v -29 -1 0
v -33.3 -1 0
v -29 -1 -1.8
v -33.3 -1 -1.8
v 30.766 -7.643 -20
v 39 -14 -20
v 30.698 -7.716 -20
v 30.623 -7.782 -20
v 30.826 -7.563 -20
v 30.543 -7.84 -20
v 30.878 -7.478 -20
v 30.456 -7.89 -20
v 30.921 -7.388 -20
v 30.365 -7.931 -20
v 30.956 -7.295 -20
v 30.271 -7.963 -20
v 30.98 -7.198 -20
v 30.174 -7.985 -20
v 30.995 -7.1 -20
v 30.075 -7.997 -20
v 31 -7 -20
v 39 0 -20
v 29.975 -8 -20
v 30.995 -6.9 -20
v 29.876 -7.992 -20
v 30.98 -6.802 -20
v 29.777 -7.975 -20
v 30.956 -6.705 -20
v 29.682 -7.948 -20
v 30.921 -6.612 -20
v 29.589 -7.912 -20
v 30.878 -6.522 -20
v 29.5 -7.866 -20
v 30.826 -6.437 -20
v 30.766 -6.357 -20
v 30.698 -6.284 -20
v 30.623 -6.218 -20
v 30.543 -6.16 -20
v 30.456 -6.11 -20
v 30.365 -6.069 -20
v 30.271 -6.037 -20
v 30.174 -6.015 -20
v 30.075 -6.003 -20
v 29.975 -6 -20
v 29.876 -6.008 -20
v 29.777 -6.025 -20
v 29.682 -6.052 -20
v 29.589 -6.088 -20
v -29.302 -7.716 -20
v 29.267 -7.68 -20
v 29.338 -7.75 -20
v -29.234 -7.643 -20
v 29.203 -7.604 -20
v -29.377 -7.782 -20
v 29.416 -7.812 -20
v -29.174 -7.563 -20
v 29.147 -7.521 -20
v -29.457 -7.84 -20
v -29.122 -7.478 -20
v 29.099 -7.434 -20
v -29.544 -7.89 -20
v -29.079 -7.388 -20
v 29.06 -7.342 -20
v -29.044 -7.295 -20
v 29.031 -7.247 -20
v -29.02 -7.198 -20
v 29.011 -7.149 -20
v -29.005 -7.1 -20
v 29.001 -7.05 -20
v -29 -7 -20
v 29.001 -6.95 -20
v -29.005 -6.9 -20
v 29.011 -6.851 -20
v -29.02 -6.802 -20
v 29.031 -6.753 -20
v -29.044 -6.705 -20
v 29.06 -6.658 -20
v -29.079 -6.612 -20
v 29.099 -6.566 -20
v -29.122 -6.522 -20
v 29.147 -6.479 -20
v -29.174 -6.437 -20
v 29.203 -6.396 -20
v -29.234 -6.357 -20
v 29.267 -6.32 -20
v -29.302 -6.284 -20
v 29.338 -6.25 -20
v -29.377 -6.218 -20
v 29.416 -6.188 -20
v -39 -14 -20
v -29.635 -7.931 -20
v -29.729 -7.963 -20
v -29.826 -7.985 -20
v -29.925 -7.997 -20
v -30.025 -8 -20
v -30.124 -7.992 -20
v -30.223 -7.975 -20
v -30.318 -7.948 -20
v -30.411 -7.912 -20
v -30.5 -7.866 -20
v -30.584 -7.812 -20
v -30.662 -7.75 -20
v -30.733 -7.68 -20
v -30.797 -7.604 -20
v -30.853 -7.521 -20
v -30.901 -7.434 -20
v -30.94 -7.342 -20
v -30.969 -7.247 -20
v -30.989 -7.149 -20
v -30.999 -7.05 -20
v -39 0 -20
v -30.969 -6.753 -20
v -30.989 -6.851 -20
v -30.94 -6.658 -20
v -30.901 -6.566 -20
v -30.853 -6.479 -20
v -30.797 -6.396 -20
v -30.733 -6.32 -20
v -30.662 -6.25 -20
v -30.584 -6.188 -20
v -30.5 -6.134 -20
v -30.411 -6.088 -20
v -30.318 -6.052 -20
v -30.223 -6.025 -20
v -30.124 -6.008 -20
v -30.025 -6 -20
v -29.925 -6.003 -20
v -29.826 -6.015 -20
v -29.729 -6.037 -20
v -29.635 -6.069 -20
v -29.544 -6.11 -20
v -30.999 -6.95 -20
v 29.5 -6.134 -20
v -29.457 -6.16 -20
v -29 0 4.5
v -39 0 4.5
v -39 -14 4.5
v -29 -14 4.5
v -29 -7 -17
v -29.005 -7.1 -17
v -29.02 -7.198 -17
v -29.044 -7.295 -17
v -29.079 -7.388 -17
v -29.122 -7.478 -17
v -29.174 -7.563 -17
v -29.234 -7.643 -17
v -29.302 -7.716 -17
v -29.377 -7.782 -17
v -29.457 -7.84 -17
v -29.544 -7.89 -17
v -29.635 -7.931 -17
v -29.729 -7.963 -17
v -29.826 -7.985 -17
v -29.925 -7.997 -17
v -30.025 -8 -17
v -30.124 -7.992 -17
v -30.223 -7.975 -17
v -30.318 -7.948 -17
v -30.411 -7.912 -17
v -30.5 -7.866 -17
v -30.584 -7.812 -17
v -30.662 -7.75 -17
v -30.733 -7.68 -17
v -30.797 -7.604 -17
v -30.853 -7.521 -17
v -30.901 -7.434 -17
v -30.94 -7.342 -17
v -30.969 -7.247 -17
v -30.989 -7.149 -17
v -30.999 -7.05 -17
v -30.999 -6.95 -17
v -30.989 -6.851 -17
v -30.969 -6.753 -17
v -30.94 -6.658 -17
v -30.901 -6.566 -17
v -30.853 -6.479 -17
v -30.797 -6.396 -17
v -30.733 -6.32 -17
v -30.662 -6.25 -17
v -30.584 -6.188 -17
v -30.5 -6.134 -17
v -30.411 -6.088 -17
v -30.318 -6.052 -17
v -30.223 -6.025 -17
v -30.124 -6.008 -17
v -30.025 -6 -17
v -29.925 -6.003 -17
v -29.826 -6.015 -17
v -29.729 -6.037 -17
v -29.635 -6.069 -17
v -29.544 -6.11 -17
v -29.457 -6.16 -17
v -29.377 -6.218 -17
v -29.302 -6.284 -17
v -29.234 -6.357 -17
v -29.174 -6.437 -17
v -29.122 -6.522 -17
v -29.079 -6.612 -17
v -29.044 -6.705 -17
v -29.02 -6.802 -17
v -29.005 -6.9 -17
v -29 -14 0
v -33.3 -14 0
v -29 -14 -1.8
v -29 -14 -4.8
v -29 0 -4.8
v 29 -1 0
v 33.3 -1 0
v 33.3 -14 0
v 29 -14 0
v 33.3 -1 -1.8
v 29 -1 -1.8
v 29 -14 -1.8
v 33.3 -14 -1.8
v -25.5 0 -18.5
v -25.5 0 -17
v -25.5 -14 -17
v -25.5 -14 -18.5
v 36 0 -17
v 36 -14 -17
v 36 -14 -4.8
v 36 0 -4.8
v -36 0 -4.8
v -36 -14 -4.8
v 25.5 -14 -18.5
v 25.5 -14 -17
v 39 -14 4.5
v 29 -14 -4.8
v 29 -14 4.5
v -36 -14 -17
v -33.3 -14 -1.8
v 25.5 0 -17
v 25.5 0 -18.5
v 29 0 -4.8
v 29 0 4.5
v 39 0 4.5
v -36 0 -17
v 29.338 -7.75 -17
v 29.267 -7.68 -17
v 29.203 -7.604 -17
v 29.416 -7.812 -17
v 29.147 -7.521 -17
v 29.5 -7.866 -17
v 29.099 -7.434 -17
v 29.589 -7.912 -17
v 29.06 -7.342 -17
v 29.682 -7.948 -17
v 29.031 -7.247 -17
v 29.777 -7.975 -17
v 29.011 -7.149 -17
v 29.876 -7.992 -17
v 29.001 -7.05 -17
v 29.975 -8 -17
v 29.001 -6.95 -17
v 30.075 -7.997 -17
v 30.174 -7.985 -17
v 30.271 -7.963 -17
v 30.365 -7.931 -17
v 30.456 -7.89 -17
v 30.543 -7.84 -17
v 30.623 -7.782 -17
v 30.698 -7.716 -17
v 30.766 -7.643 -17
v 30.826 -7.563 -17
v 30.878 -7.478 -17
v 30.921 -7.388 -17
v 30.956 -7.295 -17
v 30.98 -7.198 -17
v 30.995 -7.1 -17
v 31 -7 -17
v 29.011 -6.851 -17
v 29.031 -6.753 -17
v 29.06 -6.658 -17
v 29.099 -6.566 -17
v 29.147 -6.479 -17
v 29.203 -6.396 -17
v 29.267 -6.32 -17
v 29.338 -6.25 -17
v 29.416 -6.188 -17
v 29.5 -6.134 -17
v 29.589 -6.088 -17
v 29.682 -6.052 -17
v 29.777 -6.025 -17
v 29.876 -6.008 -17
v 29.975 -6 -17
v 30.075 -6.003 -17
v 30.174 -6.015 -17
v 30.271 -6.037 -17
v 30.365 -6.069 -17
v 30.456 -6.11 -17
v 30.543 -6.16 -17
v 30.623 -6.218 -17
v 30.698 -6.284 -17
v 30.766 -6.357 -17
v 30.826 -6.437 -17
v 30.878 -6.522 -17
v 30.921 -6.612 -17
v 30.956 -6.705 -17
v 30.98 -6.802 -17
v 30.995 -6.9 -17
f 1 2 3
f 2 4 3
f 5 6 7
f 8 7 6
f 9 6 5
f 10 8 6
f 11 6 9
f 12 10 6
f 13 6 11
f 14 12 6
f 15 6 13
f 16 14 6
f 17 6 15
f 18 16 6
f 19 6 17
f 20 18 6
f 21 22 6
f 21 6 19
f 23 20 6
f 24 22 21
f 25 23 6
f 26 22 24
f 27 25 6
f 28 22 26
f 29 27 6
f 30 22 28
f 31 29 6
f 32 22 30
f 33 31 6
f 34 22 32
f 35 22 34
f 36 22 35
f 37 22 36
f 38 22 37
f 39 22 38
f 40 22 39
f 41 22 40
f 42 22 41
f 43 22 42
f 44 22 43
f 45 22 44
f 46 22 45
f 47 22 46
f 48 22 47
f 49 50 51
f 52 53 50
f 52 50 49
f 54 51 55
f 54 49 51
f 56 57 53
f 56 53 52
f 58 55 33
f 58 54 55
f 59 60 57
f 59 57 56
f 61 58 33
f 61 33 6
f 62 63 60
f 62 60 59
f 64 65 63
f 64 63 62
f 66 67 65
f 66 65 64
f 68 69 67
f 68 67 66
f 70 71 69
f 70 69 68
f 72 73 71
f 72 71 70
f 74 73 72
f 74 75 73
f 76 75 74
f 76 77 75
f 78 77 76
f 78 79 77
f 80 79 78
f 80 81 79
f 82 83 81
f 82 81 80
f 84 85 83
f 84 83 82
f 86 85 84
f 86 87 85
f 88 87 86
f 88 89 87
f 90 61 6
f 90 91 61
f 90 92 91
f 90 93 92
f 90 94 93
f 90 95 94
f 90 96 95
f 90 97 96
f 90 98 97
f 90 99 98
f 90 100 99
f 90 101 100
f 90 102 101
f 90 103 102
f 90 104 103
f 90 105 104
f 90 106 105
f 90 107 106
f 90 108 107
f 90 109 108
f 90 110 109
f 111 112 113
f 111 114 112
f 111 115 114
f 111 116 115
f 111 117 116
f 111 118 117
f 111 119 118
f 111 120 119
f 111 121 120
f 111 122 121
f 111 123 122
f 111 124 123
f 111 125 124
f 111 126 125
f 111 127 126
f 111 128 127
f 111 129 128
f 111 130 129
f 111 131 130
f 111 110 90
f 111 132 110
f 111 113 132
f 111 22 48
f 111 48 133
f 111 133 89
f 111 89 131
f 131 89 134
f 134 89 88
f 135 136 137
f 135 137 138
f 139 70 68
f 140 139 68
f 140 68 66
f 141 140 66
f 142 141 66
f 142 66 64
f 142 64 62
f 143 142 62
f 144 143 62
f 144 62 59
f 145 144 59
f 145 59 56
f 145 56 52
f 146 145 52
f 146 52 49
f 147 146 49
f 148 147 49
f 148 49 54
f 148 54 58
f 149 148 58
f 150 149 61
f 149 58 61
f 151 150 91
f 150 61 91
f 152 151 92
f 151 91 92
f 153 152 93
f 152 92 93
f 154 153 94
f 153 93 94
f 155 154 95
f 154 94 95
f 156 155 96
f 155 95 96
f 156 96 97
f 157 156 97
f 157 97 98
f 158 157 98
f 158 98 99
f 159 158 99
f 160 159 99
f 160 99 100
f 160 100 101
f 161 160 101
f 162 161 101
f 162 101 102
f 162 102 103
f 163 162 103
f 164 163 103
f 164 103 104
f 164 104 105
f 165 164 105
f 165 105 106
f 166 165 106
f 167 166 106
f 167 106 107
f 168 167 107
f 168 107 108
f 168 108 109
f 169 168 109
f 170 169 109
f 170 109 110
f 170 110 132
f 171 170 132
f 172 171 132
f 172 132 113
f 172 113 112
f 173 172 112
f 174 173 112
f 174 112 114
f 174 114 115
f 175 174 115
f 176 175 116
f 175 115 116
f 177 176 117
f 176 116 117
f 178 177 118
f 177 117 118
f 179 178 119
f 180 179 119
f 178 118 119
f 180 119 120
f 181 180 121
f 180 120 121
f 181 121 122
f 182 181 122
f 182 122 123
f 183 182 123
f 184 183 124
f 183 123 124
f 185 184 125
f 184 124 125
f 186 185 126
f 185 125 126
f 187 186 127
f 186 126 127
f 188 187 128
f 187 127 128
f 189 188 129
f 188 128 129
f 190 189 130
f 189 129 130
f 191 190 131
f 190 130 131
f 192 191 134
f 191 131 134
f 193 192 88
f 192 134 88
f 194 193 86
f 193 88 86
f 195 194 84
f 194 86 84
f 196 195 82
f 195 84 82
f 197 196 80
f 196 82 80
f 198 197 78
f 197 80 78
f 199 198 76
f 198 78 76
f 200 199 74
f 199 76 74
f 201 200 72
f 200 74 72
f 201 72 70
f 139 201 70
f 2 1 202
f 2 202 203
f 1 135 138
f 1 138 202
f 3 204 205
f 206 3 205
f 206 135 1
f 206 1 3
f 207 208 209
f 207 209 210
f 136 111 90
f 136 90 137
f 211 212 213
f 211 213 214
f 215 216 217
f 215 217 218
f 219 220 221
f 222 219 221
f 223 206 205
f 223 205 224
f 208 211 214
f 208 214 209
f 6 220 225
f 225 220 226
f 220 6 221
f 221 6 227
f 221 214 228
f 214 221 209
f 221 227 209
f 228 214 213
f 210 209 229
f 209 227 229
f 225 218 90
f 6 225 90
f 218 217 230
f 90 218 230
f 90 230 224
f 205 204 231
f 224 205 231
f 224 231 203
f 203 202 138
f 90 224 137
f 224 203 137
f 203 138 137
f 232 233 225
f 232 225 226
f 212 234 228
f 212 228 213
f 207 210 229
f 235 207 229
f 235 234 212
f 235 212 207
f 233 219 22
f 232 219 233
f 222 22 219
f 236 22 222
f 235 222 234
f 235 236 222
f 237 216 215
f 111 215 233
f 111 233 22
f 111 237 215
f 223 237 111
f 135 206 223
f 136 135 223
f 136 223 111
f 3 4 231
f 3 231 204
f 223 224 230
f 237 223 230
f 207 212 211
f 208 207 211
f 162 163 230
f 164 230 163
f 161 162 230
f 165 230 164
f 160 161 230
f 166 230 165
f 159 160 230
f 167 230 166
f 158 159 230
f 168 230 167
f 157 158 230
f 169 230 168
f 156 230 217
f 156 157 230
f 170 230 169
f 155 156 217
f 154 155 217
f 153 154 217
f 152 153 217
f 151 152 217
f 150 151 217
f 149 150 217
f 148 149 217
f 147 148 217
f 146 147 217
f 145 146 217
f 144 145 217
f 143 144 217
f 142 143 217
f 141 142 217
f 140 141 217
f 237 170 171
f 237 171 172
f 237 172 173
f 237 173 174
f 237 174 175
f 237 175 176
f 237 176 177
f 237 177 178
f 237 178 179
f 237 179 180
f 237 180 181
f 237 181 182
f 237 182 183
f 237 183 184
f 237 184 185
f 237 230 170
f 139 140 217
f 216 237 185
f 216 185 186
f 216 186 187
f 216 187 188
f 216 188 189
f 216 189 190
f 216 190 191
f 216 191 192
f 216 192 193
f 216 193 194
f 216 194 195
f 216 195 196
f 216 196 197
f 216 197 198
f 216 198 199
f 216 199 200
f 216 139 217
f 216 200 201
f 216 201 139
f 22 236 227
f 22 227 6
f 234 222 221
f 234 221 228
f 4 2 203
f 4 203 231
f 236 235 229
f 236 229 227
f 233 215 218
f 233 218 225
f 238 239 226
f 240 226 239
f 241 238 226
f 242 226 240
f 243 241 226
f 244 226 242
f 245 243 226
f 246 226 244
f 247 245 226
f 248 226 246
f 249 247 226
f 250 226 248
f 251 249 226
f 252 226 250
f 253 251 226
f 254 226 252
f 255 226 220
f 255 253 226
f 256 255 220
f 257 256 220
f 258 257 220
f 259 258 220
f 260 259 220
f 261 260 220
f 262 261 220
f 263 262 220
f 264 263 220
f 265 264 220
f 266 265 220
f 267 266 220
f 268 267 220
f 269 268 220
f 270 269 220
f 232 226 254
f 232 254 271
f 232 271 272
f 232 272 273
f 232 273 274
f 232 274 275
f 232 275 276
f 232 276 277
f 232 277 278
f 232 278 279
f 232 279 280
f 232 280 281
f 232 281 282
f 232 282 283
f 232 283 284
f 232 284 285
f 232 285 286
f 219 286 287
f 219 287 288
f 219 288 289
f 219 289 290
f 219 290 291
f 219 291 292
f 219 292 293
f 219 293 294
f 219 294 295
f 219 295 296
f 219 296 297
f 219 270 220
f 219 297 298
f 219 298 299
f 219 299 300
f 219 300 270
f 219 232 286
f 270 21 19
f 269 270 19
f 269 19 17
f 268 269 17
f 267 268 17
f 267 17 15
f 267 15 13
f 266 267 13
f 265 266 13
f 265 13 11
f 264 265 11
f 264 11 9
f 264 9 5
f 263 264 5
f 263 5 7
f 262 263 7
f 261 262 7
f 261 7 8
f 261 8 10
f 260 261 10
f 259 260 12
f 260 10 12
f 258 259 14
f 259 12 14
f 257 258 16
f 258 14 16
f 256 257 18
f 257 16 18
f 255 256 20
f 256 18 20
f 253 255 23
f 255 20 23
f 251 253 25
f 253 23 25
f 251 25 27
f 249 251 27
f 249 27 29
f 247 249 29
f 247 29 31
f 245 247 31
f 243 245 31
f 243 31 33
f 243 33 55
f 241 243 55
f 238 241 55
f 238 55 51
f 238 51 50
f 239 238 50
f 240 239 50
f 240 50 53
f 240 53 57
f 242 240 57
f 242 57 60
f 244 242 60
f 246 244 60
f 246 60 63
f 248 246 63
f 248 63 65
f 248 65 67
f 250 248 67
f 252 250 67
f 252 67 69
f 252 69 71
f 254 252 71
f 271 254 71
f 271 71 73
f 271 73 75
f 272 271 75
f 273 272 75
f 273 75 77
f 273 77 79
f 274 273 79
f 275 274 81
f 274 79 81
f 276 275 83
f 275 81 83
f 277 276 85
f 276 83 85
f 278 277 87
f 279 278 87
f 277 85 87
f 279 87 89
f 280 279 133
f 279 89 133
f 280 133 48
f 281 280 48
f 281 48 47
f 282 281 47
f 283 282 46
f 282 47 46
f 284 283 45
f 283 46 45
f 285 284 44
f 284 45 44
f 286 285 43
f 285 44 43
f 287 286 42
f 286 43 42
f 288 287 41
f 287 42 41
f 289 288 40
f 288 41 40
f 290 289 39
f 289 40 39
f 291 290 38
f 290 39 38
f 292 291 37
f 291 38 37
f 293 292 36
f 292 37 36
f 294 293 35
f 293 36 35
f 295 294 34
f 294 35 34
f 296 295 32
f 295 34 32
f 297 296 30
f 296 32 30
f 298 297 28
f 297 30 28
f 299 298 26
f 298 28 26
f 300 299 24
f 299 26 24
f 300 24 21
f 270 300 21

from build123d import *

# Parameters (mm, degrees)
PAD_DEPTH    = 14
SKETCH001_R  = 1
POCKET_DEPTH = 5
SKETCH002_W  = 5
SKETCH002_H  = 3
PAD001_DEPTH = 1


with BuildPart() as part:
    # Sketch → Pad (new body)
    with BuildSketch(Plane.XZ):
        Polygon((-33.3, 0), (-33.3, -1.8), (-29, -1.8), (-29, -4.8), (-36, -4.8), (-36, -17), (-25.5, -17), (-25.5, -18.5), (25.5, -18.5), (25.5, -17), (36, -17), (36, -4.8), (29, -4.8), (29, -1.8), (33.3, -1.8), (33.3, 0), (29, 0), (29, 4.5), (39, 4.5), (39, -20), (-39, -20), (-39, 4.5), (-29, 4.5), (-29, 0), align=None)
    extrude(amount=PAD_DEPTH)

    # Sketch001 (on Face21 of Pad) → Pocket (cut)
    with BuildSketch(Plane(origin=(0, 0, -20), x_dir=(1, 0, 0), z_dir=(0, 0, -1))):
        with Locations((-30, 7)):
            Circle(SKETCH001_R)
        with Locations((30, 7)):
            Circle(SKETCH001_R)
    extrude(amount=-POCKET_DEPTH, mode=Mode.SUBTRACT)

    # Sketch002 (on Face4 of Pocket) → Pad001 (join)
    with BuildSketch(Plane(origin=(0, 0, 0), x_dir=(1, 0, 0), z_dir=(0, 1, 0))):
        with Locations((-31.5, 1)):
            Rectangle(SKETCH002_W, SKETCH002_H)
        with Locations((31.5, 1)):
            Rectangle(SKETCH002_W, SKETCH002_H)
    extrude(amount=-PAD001_DEPTH)


solid = part.part
